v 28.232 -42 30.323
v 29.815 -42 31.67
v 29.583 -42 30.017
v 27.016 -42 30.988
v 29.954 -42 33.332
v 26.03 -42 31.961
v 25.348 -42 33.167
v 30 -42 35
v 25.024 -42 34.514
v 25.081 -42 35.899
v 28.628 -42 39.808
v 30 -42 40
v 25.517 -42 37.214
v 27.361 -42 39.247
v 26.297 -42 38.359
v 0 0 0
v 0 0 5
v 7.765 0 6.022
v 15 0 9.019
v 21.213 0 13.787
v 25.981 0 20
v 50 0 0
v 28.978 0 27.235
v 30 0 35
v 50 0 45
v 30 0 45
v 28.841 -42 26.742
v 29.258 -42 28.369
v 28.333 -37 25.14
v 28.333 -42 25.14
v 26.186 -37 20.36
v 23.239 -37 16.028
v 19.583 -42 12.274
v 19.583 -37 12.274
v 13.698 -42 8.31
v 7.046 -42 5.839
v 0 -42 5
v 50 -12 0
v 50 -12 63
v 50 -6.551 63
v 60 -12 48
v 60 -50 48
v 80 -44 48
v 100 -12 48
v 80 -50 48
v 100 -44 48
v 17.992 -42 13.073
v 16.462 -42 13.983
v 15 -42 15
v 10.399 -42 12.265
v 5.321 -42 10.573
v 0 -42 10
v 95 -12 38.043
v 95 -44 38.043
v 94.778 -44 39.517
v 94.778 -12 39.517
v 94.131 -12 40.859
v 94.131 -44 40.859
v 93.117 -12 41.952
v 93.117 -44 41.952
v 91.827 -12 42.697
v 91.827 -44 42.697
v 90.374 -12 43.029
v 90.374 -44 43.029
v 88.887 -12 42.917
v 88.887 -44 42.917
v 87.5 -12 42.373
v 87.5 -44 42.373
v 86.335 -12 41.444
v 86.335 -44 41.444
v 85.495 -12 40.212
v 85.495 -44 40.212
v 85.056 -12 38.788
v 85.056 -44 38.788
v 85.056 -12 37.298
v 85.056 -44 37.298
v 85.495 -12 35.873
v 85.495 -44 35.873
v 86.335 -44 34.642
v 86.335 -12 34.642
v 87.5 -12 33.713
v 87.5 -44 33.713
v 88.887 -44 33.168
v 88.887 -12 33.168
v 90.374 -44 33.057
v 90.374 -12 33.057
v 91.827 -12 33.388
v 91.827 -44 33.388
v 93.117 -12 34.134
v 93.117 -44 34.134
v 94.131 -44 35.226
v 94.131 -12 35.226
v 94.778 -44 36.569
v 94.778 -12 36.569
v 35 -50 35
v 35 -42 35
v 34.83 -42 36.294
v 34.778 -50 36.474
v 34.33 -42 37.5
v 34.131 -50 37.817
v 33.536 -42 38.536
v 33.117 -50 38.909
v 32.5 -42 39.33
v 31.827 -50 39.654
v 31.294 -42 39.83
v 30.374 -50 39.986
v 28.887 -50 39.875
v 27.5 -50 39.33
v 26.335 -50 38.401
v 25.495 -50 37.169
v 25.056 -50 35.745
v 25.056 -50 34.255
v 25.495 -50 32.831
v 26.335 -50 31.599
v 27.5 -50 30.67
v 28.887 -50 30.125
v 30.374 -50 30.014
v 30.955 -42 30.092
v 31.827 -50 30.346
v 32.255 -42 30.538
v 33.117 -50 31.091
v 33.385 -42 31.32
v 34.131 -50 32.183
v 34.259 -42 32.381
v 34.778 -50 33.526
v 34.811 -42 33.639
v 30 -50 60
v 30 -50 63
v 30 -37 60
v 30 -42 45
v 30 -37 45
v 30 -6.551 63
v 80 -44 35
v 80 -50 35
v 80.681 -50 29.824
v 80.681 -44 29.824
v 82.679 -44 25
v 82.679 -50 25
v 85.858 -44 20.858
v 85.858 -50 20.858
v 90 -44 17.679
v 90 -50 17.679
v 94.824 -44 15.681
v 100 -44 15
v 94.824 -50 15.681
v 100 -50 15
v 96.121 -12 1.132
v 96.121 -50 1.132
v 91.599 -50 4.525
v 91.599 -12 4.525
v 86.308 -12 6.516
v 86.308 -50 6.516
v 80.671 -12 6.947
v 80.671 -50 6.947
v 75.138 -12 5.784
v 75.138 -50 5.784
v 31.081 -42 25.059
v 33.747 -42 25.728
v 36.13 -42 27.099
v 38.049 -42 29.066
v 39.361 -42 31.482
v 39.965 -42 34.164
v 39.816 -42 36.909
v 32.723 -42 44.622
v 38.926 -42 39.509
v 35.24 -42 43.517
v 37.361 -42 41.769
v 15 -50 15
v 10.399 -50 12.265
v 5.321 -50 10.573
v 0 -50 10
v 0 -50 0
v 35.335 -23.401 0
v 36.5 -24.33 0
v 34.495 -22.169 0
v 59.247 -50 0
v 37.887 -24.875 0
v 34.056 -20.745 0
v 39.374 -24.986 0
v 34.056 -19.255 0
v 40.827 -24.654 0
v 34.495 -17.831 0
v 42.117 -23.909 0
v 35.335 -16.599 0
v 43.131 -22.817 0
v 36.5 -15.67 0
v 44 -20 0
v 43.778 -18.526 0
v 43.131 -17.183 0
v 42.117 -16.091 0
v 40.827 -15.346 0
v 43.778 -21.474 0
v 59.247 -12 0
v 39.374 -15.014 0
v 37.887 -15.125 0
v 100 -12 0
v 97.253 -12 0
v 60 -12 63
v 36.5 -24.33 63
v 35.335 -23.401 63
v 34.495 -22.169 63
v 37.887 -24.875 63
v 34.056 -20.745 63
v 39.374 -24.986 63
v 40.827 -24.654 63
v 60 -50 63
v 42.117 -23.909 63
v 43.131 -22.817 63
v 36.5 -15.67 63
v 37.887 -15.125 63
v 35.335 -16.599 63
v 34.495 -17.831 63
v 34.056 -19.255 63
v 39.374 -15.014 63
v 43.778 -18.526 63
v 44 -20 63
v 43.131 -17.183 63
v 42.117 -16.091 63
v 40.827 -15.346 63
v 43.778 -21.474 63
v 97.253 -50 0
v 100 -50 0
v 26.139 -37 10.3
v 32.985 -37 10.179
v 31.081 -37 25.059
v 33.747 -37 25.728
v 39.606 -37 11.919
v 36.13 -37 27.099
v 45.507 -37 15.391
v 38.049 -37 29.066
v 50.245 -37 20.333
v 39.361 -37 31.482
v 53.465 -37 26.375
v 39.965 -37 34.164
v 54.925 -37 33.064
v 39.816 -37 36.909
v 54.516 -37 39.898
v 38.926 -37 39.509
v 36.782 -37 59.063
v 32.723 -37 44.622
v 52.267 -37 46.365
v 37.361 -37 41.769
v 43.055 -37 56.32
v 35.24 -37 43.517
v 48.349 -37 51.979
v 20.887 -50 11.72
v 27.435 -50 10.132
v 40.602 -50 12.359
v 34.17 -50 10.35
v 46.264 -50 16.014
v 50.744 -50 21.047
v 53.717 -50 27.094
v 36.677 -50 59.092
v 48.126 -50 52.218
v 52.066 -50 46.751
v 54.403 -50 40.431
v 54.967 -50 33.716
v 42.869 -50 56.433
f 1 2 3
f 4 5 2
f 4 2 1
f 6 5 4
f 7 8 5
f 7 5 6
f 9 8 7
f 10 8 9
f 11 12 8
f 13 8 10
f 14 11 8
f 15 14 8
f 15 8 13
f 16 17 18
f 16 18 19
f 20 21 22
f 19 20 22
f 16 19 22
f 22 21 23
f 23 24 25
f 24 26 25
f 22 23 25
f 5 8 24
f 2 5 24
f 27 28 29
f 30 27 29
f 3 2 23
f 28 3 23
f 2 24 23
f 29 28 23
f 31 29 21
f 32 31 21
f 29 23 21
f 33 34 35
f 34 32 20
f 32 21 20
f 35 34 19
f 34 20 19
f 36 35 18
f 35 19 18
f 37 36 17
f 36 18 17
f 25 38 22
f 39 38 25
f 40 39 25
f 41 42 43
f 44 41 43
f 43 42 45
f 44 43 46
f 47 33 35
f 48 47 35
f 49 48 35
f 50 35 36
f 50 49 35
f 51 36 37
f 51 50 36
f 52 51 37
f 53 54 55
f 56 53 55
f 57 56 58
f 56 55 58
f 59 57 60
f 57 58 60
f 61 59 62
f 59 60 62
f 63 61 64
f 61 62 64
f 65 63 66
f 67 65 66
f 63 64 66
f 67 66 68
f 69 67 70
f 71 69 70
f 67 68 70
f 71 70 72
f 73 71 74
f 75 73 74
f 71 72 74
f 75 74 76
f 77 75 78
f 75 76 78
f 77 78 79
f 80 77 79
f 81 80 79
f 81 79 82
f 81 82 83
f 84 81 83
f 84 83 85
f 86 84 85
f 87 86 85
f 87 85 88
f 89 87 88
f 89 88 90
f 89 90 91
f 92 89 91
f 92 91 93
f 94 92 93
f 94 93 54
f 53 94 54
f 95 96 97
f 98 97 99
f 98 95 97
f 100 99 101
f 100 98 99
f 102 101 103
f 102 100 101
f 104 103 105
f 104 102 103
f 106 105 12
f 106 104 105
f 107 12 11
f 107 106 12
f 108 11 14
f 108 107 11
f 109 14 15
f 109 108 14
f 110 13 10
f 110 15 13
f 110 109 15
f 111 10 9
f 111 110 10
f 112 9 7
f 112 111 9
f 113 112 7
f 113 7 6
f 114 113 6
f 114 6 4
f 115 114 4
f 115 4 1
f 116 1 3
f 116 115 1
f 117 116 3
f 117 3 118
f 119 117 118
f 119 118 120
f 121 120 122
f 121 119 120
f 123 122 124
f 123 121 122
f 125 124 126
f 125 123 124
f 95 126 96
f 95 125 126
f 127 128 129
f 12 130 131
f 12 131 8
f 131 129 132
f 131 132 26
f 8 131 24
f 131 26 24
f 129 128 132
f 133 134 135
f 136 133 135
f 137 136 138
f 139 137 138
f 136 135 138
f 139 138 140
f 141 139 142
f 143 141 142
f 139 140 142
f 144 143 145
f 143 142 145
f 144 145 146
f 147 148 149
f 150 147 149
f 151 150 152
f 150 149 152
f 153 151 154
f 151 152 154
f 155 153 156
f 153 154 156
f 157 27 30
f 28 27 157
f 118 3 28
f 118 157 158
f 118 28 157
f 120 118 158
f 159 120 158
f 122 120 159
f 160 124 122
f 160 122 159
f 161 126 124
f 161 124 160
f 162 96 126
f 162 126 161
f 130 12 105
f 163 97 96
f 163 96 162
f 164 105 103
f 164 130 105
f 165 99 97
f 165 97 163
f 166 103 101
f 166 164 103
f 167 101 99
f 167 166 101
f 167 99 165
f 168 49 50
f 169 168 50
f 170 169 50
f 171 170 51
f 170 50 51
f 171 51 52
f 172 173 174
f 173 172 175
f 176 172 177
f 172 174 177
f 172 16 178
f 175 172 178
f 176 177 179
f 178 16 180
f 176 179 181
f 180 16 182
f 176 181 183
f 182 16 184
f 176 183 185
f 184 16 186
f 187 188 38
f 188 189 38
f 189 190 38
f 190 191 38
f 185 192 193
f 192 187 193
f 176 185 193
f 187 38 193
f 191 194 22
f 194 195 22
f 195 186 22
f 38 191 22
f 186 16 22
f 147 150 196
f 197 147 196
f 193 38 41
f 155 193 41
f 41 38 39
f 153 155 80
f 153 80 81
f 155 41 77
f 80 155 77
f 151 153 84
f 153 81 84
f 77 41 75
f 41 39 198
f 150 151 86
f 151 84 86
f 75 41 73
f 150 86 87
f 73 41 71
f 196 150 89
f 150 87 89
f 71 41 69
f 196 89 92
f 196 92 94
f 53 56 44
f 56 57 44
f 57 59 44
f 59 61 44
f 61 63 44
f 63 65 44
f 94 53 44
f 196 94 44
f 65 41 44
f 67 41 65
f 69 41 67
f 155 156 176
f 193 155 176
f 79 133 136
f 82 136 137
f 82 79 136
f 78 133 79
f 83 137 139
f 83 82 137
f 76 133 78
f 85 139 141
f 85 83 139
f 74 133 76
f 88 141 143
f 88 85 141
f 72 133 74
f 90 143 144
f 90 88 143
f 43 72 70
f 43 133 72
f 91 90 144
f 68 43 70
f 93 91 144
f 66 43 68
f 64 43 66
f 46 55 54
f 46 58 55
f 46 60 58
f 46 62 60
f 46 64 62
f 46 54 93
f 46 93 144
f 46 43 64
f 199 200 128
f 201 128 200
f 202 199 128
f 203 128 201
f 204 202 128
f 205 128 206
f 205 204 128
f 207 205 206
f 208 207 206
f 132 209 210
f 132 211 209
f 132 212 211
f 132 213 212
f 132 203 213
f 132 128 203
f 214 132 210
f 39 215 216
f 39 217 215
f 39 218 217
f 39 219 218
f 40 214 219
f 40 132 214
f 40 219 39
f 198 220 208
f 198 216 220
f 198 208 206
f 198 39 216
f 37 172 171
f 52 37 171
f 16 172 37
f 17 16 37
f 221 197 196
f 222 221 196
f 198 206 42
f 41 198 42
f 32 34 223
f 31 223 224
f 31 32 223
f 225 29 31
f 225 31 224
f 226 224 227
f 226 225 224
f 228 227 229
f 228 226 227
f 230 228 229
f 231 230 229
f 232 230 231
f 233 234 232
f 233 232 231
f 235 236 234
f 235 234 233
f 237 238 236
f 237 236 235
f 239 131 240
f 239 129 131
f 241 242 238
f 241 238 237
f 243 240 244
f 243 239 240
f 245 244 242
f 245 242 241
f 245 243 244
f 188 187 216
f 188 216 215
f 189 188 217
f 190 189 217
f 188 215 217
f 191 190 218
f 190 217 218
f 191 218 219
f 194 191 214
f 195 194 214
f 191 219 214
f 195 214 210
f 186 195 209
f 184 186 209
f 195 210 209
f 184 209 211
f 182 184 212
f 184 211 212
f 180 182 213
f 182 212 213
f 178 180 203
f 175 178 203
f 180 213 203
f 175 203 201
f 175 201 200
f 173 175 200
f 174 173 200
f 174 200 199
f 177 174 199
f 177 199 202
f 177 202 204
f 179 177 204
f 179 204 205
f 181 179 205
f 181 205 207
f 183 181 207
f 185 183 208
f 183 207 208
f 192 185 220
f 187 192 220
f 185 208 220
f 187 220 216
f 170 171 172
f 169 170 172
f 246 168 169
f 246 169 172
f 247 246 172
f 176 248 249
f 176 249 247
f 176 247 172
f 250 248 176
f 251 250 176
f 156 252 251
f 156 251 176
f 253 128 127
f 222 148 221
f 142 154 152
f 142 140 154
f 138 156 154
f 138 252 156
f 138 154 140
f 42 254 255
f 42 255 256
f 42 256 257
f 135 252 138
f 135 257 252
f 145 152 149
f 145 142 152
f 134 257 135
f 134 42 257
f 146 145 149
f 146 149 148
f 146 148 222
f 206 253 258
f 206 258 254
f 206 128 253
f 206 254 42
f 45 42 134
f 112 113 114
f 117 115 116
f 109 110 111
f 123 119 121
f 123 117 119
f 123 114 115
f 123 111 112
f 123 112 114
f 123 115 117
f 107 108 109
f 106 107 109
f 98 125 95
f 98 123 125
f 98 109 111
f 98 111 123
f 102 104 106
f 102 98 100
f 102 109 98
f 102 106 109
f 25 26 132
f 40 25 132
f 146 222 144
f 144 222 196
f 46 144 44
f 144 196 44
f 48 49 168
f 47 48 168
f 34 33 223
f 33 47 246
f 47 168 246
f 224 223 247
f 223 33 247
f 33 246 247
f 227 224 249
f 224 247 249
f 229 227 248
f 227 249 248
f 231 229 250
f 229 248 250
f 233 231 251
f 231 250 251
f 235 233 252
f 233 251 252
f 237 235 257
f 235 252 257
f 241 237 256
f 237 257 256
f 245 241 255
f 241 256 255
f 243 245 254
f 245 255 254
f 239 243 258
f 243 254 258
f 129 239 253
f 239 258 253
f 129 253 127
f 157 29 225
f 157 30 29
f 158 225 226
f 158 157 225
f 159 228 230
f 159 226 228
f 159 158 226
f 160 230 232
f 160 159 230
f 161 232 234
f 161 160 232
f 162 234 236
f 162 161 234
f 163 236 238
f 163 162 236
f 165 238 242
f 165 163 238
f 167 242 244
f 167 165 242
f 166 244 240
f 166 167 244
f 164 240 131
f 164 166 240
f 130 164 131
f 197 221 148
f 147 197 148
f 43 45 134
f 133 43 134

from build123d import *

# Parameters (mm, degrees)
F0_W      = 100
F0_H      = 63
F1_DEPTH  = 50
F3_DEPTH  = 6
F4_DEPTH  = 50
F5_DEPTH  = 50
F2_R      = 10
F2_R_2    = 5
F6_DEPTH  = 8
F2_R_3    = 25
F7_DEPTH  = 13
F8_W      = 10
F8_H      = 12
F9_DEPTH  = 63
F10_W     = 40
F10_H     = 12
F11_DEPTH = 63
F12_R     = 5
F13_DEPTH = 50
F15_DEPTH = 50
F16_DEPTH = 42
F17_DEPTH = 42
F18_W     = 30
F18_H     = 8
F19_DEPTH = 11.4
F21_DEPTH = 100
F22_R     = 5
F23_DEPTH = 63


with BuildPart() as f1:
    # F0 (on Front) → F1 (new body)
    with BuildSketch(Plane.XZ):
        with Locations((50, 31.5)):
            Rectangle(F0_W, F0_H)
    extrude(amount=F1_DEPTH)

    # F2 (on face) → F3 (cut)
    with BuildSketch(Plane.XZ.offset(50)):
        with BuildLine():
            ThreePointArc((80, 35), (85.8578643763, 20.8578643763), (100, 15))
            Line((100, 15), (100, 48))
            Line((100, 48), (80, 48))
            Line((80, 48), (80, 35))
        make_face()
    extrude(amount=-F3_DEPTH, mode=Mode.SUBTRACT)

    # F2 (on face) → F4 (cut)
    with BuildSketch(Plane.XZ.offset(50)):
        Polygon((100, 63), (60, 63), (60, 48), (80, 48), (100, 48), align=None)
    extrude(amount=-F4_DEPTH, mode=Mode.SUBTRACT)

    # F2 (on face) → F5 (cut)
    with BuildSketch(Plane.XZ.offset(50)):
        with BuildLine():
            Line((75.1384166813, 5.7840544194), (59.246857771, 0))
            Line((59.246857771, 0), (97.253292799, 0))
            Line((97.253292799, 0), (96.1209551715, 1.1323376275))
            ThreePointArc((96.1209551715, 1.1323376275), (86.3076118266, 6.5161221461), (75.1384166813, 5.7840544194))
        make_face()
    extrude(amount=-F5_DEPTH, mode=Mode.SUBTRACT)

    # F2 (on face) → F6 (cut)
    with BuildSketch(Plane.XZ.offset(50)):
        with Locations((30, 35)):
            Circle(F2_R)
        with Locations((30, 35)):
            Circle(F2_R_2, mode=Mode.SUBTRACT)
    extrude(amount=-F6_DEPTH, mode=Mode.SUBTRACT)

    # F2 (on face) → F7 (cut)
    with BuildSketch(Plane.XZ.offset(50)):
        with Locations((30, 35)):
            Circle(F2_R_3)
        with Locations((30, 35)):
            Circle(F2_R, mode=Mode.SUBTRACT)
    extrude(amount=-F7_DEPTH, mode=Mode.SUBTRACT)

    # F8 (on face) → F9 (cut)
    with BuildSketch(Plane.XY.offset(63)):
        with Locations((55, -6)):
            Rectangle(F8_W, F8_H)
    extrude(amount=-F9_DEPTH, mode=Mode.SUBTRACT)

    # F10 (on face) → F11 (cut)
    with BuildSketch(Plane.XY.offset(48)):
        with Locations((80, -6)):
            Rectangle(F10_W, F10_H)
    extrude(amount=-F11_DEPTH, mode=Mode.SUBTRACT)

    # F12 (on face) → F13 (cut)
    with BuildSketch(Plane.XZ.offset(44)):
        with Locations((90, 38.0427613854)):
            Circle(F12_R)
    extrude(amount=-F13_DEPTH, mode=Mode.SUBTRACT)

    # F14 (on face) → F15 (cut)
    with BuildSketch(Plane(origin=(0, 0, 0), x_dir=(-1, 0, 0), z_dir=(0, 1, 0))):
        with BuildLine():
            Line((0, 10), (0, 60))
            ThreePointArc((0, 60), (-25, 35), (0, 10))
        make_face()
        with BuildLine():
            ThreePointArc((0, 10), (17.6776695297, 17.3223304703), (25, 35))
            ThreePointArc((25, 35), (17.6776695297, 52.6776695297), (0, 60))
            Line((0, 60), (0, 10))
        make_face()
    extrude(amount=-F15_DEPTH, mode=Mode.SUBTRACT)

    # F14 (on face) → F16 (cut)
    with BuildSketch(Plane(origin=(0, 0, 0), x_dir=(-1, 0, 0), z_dir=(0, 1, 0))):
        with BuildLine():
            ThreePointArc((0, 10), (-25, 35), (0, 60))
            Line((0, 60), (0, 63))
            Line((0, 63), (-10.7703296143, 63))
            ThreePointArc((-10.7703296143, 63), (-24.7296369608, 51.9836702684), (-30, 35))
            ThreePointArc((-30, 35), (-21.2132034356, 13.7867965644), (0, 5))
            Line((0, 5), (0, 10))
        make_face()
        with BuildLine():
            ThreePointArc((0, 60), (17.6776695297, 52.6776695297), (25, 35))
            ThreePointArc((25, 35), (17.6776695297, 17.3223304703), (0, 10))
            Line((0, 10), (0, 5))
            ThreePointArc((0, 5), (21.2132034356, 13.7867965644), (30, 35))
            ThreePointArc((30, 35), (16.9836702684, 59.7296369608), (-10.7703296143, 63))
            Line((-10.7703296143, 63), (0, 63))
            Line((0, 63), (0, 60))
        make_face()
    extrude(amount=F16_DEPTH, mode=Mode.SUBTRACT)

    # F14 (on face) → F17 (cut)
    with BuildSketch(Plane(origin=(0, 0, 0), x_dir=(-1, 0, 0), z_dir=(0, 1, 0))):
        with BuildLine():
            ThreePointArc((0, 10), (-25, 35), (0, 60))
            Line((0, 60), (0, 63))
            Line((0, 63), (-10.7703296143, 63))
            ThreePointArc((-10.7703296143, 63), (-24.7296369608, 51.9836702684), (-30, 35))
            ThreePointArc((-30, 35), (-21.2132034356, 13.7867965644), (0, 5))
            Line((0, 5), (0, 10))
        make_face()
        with BuildLine():
            ThreePointArc((0, 60), (17.6776695297, 52.6776695297), (25, 35))
            ThreePointArc((25, 35), (17.6776695297, 17.3223304703), (0, 10))
            Line((0, 10), (0, 5))
            ThreePointArc((0, 5), (21.2132034356, 13.7867965644), (30, 35))
            ThreePointArc((30, 35), (16.9836702684, 59.7296369608), (-10.7703296143, 63))
            Line((-10.7703296143, 63), (0, 63))
            Line((0, 63), (0, 60))
        make_face()
        with BuildLine():
            ThreePointArc((-30, 35), (-24.7296369608, 51.9836702684), (-10.7703296143, 63))
            Line((-10.7703296143, 63), (-30, 63))
            Line((-30, 63), (-30, 35))
        make_face()
    extrude(amount=-F17_DEPTH, mode=Mode.SUBTRACT)

    # F18 (on face) → F19 (cut)
    with BuildSketch(Plane.XY.offset(63)):
        with Locations((15, -46)):
            Rectangle(F18_W, F18_H)
    extrude(amount=-F19_DEPTH, mode=Mode.SUBTRACT)

    # F20 (on face) → F21 (cut)
    with BuildSketch(Plane(origin=(30, 0, 0), x_dir=(0, -1, 0), z_dir=(-1, 0, 0))):
        Polygon((6.5514642168, 63), (0, 63), (0, 45), align=None)
    extrude(amount=-F21_DEPTH, mode=Mode.SUBTRACT)

    # F22 (on face) → F23 (cut)
    with BuildSketch(Plane.XY.offset(63)):
        with Locations((39, -20)):
            Circle(F22_R)
    extrude(amount=-F23_DEPTH, mode=Mode.SUBTRACT)


solid = f1.part
